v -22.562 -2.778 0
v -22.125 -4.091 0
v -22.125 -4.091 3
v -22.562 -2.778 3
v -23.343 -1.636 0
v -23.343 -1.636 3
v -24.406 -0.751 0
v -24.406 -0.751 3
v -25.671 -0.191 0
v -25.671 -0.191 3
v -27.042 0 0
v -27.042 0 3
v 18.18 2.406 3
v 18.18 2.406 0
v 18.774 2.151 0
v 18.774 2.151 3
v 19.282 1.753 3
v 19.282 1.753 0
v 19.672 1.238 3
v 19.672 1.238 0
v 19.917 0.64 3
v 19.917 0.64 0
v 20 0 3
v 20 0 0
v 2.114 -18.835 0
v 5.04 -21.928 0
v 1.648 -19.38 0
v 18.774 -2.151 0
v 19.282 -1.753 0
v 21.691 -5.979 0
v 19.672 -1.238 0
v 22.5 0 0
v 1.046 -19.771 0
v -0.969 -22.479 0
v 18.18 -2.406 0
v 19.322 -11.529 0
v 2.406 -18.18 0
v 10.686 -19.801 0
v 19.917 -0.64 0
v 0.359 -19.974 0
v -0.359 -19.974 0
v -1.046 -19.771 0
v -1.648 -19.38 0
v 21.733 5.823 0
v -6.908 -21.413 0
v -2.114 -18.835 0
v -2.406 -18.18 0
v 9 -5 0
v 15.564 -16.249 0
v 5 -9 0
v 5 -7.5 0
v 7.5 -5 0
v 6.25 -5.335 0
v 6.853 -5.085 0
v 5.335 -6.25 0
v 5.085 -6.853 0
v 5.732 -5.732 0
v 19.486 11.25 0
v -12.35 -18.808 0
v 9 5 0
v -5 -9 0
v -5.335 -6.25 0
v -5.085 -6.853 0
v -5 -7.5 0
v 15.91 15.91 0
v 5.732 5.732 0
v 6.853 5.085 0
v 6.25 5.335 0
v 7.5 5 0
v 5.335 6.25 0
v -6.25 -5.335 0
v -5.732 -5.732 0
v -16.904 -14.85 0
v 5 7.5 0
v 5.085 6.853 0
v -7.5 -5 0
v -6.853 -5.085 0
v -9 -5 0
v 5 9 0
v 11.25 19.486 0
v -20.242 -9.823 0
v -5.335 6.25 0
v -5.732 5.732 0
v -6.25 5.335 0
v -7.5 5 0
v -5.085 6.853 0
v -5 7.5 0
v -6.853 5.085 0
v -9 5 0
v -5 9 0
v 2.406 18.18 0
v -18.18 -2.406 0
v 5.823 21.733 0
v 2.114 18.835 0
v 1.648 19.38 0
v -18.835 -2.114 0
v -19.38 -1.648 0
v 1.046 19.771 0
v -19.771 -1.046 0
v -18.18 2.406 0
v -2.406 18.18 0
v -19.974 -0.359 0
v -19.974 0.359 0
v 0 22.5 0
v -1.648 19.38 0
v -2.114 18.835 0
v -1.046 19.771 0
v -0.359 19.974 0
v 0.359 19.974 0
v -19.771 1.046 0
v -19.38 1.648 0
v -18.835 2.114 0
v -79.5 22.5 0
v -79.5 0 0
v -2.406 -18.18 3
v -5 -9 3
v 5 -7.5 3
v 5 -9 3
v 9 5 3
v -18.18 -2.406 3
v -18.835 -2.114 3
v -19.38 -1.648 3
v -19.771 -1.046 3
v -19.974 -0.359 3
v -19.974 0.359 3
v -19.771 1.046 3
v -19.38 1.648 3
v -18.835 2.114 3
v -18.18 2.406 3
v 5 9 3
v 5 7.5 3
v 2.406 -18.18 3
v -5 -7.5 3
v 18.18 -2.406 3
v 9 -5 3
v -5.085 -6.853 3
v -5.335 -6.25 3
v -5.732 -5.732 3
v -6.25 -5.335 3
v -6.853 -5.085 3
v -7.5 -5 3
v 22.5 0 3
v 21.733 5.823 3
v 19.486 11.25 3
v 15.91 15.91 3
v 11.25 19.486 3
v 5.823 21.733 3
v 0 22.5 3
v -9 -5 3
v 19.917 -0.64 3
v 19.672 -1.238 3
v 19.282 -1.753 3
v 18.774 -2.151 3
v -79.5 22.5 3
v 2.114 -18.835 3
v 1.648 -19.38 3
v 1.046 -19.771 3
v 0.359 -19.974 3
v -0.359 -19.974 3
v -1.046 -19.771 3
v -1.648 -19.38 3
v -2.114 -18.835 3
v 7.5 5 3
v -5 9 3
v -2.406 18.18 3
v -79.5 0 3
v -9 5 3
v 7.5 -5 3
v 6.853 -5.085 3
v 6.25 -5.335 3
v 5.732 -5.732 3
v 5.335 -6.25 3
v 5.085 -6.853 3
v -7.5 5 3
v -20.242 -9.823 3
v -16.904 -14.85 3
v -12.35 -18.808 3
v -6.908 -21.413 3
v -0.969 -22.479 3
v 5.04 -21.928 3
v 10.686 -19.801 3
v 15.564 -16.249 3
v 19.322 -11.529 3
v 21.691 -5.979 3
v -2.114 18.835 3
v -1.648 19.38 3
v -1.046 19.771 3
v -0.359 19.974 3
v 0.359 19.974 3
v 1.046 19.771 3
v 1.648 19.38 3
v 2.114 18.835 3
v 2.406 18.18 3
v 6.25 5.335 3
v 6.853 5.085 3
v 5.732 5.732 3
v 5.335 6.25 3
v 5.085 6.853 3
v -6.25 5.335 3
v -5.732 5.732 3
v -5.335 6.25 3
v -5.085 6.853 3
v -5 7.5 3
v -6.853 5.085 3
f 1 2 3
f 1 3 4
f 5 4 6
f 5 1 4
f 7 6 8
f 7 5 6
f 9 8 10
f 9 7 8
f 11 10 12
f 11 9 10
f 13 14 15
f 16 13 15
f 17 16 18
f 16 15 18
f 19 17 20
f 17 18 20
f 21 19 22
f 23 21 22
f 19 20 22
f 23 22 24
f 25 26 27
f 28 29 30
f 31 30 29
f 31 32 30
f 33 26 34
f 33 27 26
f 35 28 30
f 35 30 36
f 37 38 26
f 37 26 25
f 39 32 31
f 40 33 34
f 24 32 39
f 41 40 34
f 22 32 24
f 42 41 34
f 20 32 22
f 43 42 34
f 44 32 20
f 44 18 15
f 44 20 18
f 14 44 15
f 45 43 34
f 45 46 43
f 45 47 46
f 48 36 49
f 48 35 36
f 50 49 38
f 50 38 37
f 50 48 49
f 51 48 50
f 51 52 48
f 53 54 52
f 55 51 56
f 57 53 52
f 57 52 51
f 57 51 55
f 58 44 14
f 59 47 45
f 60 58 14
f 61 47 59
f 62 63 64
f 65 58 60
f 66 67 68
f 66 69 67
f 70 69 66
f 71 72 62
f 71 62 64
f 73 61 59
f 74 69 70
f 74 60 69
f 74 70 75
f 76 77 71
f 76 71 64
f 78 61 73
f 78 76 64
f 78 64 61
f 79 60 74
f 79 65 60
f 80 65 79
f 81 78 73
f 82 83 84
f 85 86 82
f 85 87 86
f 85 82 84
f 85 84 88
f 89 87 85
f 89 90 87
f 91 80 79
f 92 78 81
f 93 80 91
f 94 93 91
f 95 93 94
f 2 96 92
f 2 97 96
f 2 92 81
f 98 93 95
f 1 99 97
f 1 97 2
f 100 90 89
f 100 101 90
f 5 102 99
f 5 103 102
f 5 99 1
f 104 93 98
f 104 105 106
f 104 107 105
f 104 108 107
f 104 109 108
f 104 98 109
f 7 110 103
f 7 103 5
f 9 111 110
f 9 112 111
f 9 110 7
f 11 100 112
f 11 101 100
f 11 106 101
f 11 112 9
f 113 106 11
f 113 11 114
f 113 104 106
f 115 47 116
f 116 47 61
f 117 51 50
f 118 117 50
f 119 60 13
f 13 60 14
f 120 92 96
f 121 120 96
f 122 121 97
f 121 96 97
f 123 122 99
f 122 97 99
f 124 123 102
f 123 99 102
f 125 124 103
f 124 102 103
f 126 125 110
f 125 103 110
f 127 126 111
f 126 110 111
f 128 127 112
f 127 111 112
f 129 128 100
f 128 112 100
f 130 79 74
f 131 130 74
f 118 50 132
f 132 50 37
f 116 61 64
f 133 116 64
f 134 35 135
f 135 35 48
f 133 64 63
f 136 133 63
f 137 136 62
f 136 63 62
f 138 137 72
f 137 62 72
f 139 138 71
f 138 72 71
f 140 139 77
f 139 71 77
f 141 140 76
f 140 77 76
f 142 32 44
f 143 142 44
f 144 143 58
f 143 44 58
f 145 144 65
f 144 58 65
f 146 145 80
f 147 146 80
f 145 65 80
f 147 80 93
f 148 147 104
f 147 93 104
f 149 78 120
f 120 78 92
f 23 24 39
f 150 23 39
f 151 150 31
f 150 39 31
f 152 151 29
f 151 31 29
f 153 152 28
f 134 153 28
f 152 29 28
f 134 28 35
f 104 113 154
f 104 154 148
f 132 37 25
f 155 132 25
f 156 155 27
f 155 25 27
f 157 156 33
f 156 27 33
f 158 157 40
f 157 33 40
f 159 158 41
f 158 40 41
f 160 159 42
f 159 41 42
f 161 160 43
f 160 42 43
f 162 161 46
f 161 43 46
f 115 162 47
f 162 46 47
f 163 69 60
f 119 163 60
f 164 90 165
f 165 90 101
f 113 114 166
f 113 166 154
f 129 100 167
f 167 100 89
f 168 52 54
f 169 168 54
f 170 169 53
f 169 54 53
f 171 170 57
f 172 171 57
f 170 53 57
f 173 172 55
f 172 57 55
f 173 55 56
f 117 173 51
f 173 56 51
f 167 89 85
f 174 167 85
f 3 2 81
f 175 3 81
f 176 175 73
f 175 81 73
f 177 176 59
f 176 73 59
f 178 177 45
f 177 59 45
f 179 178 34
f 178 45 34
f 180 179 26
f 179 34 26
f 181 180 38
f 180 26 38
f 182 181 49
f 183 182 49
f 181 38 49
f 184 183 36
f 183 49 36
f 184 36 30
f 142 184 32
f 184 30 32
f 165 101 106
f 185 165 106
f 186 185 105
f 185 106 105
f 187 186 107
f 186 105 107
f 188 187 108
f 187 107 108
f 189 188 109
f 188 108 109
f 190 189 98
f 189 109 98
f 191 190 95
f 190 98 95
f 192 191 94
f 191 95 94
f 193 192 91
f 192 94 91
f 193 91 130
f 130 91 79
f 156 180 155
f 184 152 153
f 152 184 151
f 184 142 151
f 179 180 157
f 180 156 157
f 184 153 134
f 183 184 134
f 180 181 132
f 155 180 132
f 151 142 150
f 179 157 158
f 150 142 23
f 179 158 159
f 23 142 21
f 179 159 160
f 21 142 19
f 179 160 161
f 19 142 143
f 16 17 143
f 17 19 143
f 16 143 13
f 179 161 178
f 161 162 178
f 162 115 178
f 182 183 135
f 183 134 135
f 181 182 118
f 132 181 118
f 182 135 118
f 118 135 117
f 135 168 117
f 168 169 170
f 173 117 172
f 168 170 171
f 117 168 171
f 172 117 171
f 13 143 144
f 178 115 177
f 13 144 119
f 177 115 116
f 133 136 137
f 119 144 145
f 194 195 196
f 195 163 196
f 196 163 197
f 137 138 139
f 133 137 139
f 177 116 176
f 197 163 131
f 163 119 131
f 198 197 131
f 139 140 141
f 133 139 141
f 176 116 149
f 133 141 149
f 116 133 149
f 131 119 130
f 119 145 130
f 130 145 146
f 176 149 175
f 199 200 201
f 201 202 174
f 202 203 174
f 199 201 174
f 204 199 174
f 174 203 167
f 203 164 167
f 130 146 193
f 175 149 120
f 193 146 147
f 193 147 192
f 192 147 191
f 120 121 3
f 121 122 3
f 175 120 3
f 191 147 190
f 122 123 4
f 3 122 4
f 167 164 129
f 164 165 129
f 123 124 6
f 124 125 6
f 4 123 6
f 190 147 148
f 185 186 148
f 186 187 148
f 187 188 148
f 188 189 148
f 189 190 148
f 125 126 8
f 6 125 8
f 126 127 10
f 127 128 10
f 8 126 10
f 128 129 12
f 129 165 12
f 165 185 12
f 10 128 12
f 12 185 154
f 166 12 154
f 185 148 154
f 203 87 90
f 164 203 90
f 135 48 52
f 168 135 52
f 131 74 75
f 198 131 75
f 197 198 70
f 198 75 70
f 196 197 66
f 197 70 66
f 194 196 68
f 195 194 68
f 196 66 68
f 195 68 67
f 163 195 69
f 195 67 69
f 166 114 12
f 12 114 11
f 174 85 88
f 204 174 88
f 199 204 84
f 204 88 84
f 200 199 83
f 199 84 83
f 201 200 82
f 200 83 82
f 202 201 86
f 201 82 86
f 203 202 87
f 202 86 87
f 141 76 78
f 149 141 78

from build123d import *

# Parameters (mm, degrees)
SKETCH1_R           = 2.5
SKETCH1_W           = 57
SKETCH1_H           = 22.5
BOSS_EXTRUDE1_DEPTH = 3


with BuildPart() as part:
    # Sketch1 → Boss-Extrude1 (new body)
    # profile 1 of 8: a face of its own
    with BuildSketch(Plane.XY):
        with BuildLine():
            ThreePointArc((22.5, 0), (15.909902577, 15.909902577), (0, 22.5))
            Line((0, 22.5), (-22.5, 0))
            Line((-22.5, 0), (-22.124973736, -4.090909091))
            ThreePointArc((-22.124973736, -4.090909091), (2.054031517, -22.406047276), (22.5, 0))
        make_face()
        with BuildLine():
            ThreePointArc((-7.5, 5), (-9.267766953, 9.267766953), (-5, 7.5))
            Line((-5, 7.5), (-5, 9))
            Line((-5, 9), (-2.405779746, 18.179870439))
            ThreePointArc((-2.405779746, 18.179870439), (0, 20), (2.405779746, 18.179870439))
            Line((2.405779746, 18.179870439), (5, 9))
            Line((5, 9), (5, 7.5))
            ThreePointArc((5, 7.5), (7.5, 10), (10, 7.5))
            ThreePointArc((10, 7.5), (9.267766953, 5.732233047), (7.5, 5))
            Line((7.5, 5), (9, 5))
            Line((9, 5), (18.179870439, 2.405779746))
            ThreePointArc((18.179870439, 2.405779746), (19.493699588, 1.508363998), (20, 0))
            ThreePointArc((20, 0), (19.493699588, -1.508363998), (18.179870439, -2.405779746))
            Line((18.179870439, -2.405779746), (9, -5))
            Line((9, -5), (7.5, -5))
            ThreePointArc((7.5, -5), (9.267766953, -5.732233047), (10, -7.5))
            ThreePointArc((10, -7.5), (7.5, -10), (5, -7.5))
            Line((5, -7.5), (5, -9))
            Line((5, -9), (2.405779746, -18.179870439))
            ThreePointArc((2.405779746, -18.179870439), (0, -20), (-2.405779746, -18.179870439))
            Line((-2.405779746, -18.179870439), (-5, -9))
            Line((-5, -9), (-5, -7.5))
            ThreePointArc((-5, -7.5), (-9.267766953, -9.267766953), (-7.5, -5))
            Line((-7.5, -5), (-9, -5))
            Line((-9, -5), (-18.179870439, -2.405779746))
            ThreePointArc((-18.179870439, -2.405779746), (-20, 0), (-18.179870439, 2.405779746))
            Line((-18.179870439, 2.405779746), (-9, 5))
            Line((-9, 5), (-7.5, 5))
        make_face(mode=Mode.SUBTRACT)
    # profile 2 of 8: a face of its own
    with BuildSketch(Plane.XY):
        with Locations((-7.5, 7.5)):
            Circle(SKETCH1_R)
    # profile 3 of 8: a face of its own
    with BuildSketch(Plane.XY):
        with Locations((7.5, 7.5)):
            Circle(SKETCH1_R)
    # profile 4 of 8: a face of its own
    with BuildSketch(Plane.XY):
        with Locations((7.5, -7.5)):
            Circle(SKETCH1_R)
    # profile 5 of 8: a face of its own
    with BuildSketch(Plane.XY):
        with Locations((-7.5, -7.5)):
            Circle(SKETCH1_R)
    # profile 6 of 8: a face of its own
    with BuildSketch(Plane.XY):
        Polygon((-22.5, 22.5), (0, 22.5), (-22.5, 0), align=None)
    # profile 7 of 8: a face of its own
    with BuildSketch(Plane.XY):
        with Locations((-51, 11.25)):
            Rectangle(SKETCH1_W, SKETCH1_H)
    # profile 8 of 8: a face of its own
    with BuildSketch(Plane.XY):
        with BuildLine():
            Line((-22.5, 0), (-22.124973736, -4.090909091))
            ThreePointArc((-22.124973736, -4.090909091), (-23.843623821, -1.156469426), (-27.041634566, 0))
            Line((-27.041634566, 0), (-22.5, 0))
        make_face()
    extrude(amount=BOSS_EXTRUDE1_DEPTH)


solid = part.part
